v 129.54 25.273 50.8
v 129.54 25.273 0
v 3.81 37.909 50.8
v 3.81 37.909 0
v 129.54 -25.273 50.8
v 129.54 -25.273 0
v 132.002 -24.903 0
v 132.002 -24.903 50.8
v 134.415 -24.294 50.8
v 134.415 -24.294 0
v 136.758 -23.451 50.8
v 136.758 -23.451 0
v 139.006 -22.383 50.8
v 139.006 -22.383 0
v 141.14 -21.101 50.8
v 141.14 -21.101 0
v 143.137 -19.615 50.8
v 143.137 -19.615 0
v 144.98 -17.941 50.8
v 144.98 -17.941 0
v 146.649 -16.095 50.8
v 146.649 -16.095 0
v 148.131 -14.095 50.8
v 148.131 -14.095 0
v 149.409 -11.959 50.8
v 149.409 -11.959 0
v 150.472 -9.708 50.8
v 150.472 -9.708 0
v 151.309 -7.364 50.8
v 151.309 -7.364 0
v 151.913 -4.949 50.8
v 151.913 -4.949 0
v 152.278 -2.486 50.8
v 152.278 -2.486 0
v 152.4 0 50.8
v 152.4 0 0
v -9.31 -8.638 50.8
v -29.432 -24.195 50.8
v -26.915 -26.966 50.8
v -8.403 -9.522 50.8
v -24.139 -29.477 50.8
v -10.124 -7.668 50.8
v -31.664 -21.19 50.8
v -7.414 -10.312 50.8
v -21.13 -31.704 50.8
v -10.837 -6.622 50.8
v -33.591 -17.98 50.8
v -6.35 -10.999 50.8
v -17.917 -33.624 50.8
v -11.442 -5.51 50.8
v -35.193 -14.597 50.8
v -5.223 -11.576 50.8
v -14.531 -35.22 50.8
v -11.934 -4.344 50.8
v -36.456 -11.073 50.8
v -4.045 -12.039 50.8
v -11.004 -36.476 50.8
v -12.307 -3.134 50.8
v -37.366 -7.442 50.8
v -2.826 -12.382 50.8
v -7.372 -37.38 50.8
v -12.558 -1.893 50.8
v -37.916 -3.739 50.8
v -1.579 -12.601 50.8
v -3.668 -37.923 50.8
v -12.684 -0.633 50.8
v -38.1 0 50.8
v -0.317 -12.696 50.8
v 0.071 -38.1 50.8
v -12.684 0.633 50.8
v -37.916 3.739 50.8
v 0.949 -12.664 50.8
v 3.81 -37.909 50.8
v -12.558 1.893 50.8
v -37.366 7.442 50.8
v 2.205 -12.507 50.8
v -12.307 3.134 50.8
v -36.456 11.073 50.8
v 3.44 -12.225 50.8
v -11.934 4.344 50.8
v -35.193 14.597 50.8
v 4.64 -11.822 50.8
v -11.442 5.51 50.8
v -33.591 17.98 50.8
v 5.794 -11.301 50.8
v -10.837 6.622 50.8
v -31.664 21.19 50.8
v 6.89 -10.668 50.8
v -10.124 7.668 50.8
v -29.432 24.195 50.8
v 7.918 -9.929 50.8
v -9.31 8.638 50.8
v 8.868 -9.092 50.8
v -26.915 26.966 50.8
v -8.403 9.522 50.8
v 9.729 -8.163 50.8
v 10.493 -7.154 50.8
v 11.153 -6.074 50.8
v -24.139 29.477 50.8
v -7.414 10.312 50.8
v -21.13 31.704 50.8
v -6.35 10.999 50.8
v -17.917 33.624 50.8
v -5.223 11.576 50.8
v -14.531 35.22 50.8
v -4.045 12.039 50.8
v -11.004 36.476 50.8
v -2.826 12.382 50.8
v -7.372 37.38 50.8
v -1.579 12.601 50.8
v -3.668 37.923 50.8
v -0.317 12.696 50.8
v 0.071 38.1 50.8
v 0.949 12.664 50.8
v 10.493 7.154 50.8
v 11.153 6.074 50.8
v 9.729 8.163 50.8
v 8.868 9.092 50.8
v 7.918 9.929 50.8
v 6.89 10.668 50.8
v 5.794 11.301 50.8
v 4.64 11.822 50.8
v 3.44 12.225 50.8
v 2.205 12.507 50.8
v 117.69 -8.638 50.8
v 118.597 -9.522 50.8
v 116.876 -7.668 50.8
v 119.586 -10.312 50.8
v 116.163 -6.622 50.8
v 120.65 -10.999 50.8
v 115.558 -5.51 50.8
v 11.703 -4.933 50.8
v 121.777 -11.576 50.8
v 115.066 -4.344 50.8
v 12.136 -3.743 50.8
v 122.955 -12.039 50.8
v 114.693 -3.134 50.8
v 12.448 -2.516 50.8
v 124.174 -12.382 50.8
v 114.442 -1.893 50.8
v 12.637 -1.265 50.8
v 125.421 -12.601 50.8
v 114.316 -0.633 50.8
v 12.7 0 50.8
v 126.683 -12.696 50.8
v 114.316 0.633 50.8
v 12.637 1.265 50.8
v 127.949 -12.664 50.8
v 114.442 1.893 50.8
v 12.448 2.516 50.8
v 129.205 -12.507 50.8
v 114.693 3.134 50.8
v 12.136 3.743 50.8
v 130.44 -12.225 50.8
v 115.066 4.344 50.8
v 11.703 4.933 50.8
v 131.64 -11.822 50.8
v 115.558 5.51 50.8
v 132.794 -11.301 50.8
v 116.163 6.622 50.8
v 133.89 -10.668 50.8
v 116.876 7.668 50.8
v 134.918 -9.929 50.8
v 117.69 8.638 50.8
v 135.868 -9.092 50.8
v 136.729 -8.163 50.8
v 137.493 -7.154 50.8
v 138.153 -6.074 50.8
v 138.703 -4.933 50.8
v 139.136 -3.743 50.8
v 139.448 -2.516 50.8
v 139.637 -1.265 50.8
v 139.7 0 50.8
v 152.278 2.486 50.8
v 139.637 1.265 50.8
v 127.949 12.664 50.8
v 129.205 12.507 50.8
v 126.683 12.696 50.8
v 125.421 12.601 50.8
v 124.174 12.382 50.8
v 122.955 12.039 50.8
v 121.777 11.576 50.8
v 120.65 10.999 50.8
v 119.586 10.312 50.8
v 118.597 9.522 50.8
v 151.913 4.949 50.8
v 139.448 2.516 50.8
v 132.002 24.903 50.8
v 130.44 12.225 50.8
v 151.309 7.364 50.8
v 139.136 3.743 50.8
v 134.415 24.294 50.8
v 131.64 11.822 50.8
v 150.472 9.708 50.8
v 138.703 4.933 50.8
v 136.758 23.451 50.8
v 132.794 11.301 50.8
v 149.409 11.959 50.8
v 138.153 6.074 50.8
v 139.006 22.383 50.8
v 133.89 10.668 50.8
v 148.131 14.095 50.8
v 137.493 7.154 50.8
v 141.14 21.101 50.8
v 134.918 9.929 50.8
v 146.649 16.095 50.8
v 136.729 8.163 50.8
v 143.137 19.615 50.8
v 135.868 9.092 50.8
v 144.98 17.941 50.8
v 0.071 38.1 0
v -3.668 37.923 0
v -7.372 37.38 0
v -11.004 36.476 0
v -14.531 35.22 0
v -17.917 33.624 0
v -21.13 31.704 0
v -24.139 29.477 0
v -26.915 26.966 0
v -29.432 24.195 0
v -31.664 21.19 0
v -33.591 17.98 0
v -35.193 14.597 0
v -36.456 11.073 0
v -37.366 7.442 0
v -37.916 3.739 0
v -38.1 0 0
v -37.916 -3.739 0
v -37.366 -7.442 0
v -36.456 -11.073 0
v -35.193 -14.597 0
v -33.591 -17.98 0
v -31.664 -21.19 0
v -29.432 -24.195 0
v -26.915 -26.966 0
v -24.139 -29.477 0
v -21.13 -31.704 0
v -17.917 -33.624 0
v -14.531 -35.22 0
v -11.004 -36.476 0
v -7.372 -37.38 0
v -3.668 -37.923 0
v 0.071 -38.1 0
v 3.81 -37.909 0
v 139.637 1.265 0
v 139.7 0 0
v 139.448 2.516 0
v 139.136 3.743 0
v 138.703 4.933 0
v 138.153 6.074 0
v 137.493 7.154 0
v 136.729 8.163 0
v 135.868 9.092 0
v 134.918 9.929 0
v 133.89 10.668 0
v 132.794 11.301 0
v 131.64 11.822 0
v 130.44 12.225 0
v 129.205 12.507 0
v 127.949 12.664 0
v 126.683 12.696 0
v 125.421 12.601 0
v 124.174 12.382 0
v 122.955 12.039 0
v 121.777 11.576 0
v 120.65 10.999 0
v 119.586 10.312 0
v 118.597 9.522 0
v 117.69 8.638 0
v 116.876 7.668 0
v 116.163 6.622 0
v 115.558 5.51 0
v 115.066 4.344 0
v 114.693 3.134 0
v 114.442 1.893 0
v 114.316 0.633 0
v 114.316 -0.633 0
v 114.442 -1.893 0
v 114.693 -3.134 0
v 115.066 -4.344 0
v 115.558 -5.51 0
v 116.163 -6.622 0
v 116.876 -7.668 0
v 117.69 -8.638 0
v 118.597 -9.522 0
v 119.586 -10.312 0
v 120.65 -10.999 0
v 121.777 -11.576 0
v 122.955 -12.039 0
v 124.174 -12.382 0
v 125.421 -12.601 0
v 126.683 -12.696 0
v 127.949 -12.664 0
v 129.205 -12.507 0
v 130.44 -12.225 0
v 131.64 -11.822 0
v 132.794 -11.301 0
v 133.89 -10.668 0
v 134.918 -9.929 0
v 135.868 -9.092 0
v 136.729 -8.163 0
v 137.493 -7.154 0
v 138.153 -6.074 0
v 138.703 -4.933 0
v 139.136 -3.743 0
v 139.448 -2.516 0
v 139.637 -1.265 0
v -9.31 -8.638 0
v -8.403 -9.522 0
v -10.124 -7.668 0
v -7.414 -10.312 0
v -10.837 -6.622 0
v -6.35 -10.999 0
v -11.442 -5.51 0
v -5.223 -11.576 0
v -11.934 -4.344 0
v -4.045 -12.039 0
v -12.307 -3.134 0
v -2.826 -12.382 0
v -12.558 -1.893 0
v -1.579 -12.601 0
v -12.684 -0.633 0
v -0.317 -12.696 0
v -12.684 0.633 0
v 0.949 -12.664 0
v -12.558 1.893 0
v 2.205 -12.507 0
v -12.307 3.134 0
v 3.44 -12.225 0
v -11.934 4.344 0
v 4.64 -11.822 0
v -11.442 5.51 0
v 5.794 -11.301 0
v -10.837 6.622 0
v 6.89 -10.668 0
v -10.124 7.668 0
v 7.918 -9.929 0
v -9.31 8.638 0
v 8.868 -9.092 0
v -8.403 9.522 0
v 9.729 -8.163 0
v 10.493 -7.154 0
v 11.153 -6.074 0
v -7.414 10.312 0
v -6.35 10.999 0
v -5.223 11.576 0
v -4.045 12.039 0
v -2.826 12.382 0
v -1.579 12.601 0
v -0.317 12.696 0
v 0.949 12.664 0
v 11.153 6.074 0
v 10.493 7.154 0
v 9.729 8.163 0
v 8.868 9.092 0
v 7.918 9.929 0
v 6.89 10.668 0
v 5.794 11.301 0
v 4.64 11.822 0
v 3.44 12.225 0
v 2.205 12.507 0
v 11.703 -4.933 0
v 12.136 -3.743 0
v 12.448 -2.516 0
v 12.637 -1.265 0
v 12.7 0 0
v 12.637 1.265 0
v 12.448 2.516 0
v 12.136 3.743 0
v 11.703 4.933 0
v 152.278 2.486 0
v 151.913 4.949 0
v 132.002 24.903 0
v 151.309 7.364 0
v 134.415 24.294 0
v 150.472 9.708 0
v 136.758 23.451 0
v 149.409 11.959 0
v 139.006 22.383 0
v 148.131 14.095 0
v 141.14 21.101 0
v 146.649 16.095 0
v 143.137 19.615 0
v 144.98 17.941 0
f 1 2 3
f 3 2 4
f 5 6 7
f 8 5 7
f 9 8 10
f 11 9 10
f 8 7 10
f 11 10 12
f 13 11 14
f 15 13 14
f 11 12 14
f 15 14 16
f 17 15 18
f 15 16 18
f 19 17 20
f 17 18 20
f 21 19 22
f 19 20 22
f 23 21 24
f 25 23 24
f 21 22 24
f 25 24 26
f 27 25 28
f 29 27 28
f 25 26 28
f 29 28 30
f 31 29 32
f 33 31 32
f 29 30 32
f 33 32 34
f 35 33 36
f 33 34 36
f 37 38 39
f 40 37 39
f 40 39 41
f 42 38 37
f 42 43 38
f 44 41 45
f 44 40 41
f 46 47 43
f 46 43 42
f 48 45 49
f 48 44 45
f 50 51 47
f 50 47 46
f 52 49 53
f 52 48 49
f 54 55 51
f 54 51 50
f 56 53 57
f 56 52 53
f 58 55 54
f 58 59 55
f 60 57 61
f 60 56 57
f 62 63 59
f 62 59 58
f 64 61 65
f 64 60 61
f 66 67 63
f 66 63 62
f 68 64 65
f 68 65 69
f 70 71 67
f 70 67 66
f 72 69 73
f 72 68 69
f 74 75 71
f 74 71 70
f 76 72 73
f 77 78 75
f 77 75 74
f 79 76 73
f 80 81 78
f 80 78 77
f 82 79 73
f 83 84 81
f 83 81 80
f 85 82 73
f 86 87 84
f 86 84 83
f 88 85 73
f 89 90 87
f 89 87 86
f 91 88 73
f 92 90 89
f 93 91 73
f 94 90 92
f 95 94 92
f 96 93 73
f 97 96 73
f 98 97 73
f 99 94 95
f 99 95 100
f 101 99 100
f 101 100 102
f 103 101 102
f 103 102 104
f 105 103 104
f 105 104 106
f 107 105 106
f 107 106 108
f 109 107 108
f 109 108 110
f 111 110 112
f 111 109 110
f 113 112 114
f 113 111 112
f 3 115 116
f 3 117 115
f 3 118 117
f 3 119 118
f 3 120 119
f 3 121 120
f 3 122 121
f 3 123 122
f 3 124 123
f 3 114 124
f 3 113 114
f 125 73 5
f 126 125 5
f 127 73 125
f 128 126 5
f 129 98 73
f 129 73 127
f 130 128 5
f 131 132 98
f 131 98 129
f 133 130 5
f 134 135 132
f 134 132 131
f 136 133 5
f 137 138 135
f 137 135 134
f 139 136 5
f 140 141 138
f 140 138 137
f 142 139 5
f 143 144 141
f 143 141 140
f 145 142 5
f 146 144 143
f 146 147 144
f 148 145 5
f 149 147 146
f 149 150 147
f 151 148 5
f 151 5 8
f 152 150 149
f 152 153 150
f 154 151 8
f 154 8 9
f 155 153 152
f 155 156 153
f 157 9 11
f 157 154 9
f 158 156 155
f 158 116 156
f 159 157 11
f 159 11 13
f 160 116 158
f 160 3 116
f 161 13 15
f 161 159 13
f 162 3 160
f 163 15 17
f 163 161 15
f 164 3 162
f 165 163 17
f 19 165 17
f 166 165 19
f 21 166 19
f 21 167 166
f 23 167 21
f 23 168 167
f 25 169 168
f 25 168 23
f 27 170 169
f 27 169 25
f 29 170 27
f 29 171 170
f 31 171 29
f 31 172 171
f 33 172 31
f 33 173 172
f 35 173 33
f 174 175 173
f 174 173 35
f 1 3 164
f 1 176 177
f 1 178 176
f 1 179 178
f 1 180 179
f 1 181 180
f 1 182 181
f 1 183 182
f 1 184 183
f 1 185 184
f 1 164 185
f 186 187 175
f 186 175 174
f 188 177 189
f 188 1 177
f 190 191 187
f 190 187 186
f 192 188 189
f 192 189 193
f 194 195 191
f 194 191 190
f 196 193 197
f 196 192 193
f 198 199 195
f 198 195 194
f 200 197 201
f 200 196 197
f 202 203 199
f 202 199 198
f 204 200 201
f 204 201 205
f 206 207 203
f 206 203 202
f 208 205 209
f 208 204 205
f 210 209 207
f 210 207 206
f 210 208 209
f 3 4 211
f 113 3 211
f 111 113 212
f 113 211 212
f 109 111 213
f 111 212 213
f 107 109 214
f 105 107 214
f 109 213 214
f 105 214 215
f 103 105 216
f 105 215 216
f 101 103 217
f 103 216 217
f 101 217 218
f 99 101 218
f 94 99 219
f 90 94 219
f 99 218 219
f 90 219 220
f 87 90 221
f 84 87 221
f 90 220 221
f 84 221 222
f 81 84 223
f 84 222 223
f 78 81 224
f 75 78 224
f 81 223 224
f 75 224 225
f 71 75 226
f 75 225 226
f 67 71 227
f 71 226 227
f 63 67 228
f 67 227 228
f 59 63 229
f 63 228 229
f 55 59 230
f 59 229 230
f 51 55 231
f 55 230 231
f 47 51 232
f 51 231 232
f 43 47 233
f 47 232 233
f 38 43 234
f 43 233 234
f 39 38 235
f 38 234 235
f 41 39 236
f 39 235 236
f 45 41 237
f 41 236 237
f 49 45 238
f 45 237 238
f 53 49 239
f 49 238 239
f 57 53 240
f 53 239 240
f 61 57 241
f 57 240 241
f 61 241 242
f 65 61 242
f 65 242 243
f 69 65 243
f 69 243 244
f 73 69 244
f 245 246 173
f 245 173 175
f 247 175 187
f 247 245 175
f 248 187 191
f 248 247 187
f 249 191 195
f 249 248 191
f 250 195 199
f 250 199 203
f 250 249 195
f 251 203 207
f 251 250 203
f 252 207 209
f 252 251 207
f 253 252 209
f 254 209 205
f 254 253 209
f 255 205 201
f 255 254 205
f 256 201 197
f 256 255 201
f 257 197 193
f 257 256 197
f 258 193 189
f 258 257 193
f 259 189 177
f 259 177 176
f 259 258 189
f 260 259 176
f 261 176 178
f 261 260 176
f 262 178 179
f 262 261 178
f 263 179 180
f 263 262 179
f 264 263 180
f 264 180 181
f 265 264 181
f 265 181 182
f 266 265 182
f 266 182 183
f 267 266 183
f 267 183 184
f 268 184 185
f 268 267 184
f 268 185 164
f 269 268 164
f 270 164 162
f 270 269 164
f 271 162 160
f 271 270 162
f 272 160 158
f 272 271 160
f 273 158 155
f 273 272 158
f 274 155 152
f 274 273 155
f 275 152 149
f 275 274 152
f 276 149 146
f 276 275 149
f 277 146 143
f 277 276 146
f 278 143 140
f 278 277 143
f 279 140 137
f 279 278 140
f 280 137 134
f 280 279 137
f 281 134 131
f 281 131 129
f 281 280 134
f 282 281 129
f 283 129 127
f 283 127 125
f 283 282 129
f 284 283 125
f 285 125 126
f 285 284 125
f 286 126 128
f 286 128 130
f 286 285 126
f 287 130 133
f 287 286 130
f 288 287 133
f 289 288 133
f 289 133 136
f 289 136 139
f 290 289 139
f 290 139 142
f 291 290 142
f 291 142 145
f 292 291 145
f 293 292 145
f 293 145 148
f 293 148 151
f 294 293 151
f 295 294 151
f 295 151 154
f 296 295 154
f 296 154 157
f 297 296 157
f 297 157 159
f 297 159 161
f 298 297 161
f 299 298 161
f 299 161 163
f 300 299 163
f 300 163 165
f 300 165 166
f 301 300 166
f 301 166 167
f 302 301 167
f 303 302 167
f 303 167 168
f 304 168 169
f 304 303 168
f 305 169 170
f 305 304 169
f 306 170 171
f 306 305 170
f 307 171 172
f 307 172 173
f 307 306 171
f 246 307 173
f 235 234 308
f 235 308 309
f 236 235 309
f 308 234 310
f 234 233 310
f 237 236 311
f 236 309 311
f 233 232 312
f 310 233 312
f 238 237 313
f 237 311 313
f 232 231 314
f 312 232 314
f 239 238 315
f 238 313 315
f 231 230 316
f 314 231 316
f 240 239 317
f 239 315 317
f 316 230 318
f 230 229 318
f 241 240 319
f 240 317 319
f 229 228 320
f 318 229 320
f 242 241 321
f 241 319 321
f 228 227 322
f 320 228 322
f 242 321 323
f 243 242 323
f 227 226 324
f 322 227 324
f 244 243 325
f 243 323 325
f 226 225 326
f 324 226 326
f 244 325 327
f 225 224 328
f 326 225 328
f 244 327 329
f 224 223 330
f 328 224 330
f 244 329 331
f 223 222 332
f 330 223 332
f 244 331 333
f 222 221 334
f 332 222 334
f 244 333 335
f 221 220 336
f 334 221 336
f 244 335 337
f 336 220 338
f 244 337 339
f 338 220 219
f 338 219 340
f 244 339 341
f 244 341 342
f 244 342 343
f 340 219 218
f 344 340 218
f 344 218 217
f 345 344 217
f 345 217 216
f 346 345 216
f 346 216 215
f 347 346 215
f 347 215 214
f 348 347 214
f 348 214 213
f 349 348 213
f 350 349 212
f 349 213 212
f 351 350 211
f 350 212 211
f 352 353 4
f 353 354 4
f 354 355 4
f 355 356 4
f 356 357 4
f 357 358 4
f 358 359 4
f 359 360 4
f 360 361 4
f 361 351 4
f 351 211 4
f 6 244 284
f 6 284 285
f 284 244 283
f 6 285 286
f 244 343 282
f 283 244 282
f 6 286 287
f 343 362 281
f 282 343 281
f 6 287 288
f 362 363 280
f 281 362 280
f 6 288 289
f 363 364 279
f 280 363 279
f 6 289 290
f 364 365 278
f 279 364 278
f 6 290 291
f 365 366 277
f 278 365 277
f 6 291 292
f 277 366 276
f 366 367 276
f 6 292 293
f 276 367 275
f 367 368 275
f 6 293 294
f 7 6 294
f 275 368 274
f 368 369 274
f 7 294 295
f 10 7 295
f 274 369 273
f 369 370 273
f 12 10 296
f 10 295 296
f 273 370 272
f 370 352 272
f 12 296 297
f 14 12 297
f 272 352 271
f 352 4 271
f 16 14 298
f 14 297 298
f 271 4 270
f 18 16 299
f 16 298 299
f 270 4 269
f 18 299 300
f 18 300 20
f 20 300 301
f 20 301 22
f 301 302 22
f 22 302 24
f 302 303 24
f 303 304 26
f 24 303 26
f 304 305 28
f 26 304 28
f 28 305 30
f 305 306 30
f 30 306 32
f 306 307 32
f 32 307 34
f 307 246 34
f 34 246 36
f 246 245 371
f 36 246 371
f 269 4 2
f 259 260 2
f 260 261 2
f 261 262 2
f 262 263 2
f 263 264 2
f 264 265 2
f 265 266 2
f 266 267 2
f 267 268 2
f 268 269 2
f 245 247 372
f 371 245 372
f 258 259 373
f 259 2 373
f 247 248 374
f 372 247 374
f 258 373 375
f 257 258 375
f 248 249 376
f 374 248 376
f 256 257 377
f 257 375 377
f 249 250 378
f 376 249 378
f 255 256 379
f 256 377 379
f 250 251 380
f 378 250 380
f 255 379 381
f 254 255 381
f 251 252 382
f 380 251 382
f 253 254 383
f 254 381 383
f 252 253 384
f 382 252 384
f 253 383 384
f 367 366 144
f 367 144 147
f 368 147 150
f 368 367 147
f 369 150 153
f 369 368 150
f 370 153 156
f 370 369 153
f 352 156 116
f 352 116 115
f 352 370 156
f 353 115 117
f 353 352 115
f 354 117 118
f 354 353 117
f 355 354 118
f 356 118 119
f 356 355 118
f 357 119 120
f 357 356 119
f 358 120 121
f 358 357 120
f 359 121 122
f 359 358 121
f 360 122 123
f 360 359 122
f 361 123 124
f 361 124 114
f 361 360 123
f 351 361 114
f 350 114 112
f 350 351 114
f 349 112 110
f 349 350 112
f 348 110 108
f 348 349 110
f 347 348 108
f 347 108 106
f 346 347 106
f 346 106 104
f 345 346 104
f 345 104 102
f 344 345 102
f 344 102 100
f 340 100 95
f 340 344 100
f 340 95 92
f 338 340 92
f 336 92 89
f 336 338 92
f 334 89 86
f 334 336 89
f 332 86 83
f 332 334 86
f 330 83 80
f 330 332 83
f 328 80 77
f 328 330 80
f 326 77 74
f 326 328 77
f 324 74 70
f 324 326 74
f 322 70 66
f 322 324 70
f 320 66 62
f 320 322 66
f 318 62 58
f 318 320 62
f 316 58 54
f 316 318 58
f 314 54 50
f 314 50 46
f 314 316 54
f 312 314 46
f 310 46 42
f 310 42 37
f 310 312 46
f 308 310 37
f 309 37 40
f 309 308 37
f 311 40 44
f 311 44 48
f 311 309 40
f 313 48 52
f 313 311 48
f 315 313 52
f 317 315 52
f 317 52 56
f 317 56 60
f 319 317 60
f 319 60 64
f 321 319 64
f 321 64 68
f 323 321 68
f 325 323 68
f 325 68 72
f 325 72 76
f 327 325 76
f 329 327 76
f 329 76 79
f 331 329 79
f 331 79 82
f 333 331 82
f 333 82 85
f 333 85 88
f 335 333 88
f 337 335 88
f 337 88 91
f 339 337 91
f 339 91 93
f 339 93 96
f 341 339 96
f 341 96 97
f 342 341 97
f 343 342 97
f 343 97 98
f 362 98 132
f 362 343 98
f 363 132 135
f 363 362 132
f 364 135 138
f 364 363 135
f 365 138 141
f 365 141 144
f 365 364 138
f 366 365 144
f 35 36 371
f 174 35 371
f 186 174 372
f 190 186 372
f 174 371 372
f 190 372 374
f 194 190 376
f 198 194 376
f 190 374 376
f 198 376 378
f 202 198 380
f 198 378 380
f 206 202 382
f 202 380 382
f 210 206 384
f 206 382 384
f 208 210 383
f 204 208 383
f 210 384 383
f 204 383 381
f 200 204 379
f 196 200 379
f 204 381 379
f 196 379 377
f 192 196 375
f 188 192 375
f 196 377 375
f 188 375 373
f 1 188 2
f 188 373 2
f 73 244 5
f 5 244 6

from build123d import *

# Parameters (mm, degrees)
F0_R     = 12.7
F1_DEPTH = 50.8


# Not quite as in the source:
# - the program builds the solid bodies; features that only make, move or delete a surface that nothing else refers to are left out


with BuildPart() as f1:
    # F0 (on Top) → F1 (new body)
    with BuildSketch(Plane.XY):
        with BuildLine():
            ThreePointArc((3.81, -37.9090213538), (28.2557162358, -25.5582569828), (38.1, 0))
            ThreePointArc((38.1, 0), (28.2557162358, 25.5582569828), (3.81, 37.9090213538))
            ThreePointArc((3.81, 37.9090213538), (-38.1, 0), (3.81, -37.9090213538))
        make_face()
        Circle(F0_R, mode=Mode.SUBTRACT)
        with BuildLine():
            ThreePointArc((3.81, 37.9090213538), (28.2557162358, 25.5582569828), (38.1, 0))
            ThreePointArc((38.1, 0), (28.2557162358, -25.5582569828), (3.81, -37.9090213538))
            Line((3.81, -37.9090213538), (129.54, -25.2726809025))
            ThreePointArc((129.54, -25.2726809025), (101.6, 0), (129.54, 25.2726809025))
            Line((129.54, 25.2726809025), (3.81, 37.9090213538))
        make_face()
        with BuildLine():
            ThreePointArc((152.4, 0), (145.8371441572, 17.0388379885), (129.54, 25.2726809025))
            ThreePointArc((129.54, 25.2726809025), (101.6, 0), (129.54, -25.2726809025))
            ThreePointArc((129.54, -25.2726809025), (145.8371441572, -17.0388379885), (152.4, 0))
        make_face()
        with Locations((127, 0)):
            Circle(F0_R, mode=Mode.SUBTRACT)
    extrude(amount=F1_DEPTH)


solid = f1.part
